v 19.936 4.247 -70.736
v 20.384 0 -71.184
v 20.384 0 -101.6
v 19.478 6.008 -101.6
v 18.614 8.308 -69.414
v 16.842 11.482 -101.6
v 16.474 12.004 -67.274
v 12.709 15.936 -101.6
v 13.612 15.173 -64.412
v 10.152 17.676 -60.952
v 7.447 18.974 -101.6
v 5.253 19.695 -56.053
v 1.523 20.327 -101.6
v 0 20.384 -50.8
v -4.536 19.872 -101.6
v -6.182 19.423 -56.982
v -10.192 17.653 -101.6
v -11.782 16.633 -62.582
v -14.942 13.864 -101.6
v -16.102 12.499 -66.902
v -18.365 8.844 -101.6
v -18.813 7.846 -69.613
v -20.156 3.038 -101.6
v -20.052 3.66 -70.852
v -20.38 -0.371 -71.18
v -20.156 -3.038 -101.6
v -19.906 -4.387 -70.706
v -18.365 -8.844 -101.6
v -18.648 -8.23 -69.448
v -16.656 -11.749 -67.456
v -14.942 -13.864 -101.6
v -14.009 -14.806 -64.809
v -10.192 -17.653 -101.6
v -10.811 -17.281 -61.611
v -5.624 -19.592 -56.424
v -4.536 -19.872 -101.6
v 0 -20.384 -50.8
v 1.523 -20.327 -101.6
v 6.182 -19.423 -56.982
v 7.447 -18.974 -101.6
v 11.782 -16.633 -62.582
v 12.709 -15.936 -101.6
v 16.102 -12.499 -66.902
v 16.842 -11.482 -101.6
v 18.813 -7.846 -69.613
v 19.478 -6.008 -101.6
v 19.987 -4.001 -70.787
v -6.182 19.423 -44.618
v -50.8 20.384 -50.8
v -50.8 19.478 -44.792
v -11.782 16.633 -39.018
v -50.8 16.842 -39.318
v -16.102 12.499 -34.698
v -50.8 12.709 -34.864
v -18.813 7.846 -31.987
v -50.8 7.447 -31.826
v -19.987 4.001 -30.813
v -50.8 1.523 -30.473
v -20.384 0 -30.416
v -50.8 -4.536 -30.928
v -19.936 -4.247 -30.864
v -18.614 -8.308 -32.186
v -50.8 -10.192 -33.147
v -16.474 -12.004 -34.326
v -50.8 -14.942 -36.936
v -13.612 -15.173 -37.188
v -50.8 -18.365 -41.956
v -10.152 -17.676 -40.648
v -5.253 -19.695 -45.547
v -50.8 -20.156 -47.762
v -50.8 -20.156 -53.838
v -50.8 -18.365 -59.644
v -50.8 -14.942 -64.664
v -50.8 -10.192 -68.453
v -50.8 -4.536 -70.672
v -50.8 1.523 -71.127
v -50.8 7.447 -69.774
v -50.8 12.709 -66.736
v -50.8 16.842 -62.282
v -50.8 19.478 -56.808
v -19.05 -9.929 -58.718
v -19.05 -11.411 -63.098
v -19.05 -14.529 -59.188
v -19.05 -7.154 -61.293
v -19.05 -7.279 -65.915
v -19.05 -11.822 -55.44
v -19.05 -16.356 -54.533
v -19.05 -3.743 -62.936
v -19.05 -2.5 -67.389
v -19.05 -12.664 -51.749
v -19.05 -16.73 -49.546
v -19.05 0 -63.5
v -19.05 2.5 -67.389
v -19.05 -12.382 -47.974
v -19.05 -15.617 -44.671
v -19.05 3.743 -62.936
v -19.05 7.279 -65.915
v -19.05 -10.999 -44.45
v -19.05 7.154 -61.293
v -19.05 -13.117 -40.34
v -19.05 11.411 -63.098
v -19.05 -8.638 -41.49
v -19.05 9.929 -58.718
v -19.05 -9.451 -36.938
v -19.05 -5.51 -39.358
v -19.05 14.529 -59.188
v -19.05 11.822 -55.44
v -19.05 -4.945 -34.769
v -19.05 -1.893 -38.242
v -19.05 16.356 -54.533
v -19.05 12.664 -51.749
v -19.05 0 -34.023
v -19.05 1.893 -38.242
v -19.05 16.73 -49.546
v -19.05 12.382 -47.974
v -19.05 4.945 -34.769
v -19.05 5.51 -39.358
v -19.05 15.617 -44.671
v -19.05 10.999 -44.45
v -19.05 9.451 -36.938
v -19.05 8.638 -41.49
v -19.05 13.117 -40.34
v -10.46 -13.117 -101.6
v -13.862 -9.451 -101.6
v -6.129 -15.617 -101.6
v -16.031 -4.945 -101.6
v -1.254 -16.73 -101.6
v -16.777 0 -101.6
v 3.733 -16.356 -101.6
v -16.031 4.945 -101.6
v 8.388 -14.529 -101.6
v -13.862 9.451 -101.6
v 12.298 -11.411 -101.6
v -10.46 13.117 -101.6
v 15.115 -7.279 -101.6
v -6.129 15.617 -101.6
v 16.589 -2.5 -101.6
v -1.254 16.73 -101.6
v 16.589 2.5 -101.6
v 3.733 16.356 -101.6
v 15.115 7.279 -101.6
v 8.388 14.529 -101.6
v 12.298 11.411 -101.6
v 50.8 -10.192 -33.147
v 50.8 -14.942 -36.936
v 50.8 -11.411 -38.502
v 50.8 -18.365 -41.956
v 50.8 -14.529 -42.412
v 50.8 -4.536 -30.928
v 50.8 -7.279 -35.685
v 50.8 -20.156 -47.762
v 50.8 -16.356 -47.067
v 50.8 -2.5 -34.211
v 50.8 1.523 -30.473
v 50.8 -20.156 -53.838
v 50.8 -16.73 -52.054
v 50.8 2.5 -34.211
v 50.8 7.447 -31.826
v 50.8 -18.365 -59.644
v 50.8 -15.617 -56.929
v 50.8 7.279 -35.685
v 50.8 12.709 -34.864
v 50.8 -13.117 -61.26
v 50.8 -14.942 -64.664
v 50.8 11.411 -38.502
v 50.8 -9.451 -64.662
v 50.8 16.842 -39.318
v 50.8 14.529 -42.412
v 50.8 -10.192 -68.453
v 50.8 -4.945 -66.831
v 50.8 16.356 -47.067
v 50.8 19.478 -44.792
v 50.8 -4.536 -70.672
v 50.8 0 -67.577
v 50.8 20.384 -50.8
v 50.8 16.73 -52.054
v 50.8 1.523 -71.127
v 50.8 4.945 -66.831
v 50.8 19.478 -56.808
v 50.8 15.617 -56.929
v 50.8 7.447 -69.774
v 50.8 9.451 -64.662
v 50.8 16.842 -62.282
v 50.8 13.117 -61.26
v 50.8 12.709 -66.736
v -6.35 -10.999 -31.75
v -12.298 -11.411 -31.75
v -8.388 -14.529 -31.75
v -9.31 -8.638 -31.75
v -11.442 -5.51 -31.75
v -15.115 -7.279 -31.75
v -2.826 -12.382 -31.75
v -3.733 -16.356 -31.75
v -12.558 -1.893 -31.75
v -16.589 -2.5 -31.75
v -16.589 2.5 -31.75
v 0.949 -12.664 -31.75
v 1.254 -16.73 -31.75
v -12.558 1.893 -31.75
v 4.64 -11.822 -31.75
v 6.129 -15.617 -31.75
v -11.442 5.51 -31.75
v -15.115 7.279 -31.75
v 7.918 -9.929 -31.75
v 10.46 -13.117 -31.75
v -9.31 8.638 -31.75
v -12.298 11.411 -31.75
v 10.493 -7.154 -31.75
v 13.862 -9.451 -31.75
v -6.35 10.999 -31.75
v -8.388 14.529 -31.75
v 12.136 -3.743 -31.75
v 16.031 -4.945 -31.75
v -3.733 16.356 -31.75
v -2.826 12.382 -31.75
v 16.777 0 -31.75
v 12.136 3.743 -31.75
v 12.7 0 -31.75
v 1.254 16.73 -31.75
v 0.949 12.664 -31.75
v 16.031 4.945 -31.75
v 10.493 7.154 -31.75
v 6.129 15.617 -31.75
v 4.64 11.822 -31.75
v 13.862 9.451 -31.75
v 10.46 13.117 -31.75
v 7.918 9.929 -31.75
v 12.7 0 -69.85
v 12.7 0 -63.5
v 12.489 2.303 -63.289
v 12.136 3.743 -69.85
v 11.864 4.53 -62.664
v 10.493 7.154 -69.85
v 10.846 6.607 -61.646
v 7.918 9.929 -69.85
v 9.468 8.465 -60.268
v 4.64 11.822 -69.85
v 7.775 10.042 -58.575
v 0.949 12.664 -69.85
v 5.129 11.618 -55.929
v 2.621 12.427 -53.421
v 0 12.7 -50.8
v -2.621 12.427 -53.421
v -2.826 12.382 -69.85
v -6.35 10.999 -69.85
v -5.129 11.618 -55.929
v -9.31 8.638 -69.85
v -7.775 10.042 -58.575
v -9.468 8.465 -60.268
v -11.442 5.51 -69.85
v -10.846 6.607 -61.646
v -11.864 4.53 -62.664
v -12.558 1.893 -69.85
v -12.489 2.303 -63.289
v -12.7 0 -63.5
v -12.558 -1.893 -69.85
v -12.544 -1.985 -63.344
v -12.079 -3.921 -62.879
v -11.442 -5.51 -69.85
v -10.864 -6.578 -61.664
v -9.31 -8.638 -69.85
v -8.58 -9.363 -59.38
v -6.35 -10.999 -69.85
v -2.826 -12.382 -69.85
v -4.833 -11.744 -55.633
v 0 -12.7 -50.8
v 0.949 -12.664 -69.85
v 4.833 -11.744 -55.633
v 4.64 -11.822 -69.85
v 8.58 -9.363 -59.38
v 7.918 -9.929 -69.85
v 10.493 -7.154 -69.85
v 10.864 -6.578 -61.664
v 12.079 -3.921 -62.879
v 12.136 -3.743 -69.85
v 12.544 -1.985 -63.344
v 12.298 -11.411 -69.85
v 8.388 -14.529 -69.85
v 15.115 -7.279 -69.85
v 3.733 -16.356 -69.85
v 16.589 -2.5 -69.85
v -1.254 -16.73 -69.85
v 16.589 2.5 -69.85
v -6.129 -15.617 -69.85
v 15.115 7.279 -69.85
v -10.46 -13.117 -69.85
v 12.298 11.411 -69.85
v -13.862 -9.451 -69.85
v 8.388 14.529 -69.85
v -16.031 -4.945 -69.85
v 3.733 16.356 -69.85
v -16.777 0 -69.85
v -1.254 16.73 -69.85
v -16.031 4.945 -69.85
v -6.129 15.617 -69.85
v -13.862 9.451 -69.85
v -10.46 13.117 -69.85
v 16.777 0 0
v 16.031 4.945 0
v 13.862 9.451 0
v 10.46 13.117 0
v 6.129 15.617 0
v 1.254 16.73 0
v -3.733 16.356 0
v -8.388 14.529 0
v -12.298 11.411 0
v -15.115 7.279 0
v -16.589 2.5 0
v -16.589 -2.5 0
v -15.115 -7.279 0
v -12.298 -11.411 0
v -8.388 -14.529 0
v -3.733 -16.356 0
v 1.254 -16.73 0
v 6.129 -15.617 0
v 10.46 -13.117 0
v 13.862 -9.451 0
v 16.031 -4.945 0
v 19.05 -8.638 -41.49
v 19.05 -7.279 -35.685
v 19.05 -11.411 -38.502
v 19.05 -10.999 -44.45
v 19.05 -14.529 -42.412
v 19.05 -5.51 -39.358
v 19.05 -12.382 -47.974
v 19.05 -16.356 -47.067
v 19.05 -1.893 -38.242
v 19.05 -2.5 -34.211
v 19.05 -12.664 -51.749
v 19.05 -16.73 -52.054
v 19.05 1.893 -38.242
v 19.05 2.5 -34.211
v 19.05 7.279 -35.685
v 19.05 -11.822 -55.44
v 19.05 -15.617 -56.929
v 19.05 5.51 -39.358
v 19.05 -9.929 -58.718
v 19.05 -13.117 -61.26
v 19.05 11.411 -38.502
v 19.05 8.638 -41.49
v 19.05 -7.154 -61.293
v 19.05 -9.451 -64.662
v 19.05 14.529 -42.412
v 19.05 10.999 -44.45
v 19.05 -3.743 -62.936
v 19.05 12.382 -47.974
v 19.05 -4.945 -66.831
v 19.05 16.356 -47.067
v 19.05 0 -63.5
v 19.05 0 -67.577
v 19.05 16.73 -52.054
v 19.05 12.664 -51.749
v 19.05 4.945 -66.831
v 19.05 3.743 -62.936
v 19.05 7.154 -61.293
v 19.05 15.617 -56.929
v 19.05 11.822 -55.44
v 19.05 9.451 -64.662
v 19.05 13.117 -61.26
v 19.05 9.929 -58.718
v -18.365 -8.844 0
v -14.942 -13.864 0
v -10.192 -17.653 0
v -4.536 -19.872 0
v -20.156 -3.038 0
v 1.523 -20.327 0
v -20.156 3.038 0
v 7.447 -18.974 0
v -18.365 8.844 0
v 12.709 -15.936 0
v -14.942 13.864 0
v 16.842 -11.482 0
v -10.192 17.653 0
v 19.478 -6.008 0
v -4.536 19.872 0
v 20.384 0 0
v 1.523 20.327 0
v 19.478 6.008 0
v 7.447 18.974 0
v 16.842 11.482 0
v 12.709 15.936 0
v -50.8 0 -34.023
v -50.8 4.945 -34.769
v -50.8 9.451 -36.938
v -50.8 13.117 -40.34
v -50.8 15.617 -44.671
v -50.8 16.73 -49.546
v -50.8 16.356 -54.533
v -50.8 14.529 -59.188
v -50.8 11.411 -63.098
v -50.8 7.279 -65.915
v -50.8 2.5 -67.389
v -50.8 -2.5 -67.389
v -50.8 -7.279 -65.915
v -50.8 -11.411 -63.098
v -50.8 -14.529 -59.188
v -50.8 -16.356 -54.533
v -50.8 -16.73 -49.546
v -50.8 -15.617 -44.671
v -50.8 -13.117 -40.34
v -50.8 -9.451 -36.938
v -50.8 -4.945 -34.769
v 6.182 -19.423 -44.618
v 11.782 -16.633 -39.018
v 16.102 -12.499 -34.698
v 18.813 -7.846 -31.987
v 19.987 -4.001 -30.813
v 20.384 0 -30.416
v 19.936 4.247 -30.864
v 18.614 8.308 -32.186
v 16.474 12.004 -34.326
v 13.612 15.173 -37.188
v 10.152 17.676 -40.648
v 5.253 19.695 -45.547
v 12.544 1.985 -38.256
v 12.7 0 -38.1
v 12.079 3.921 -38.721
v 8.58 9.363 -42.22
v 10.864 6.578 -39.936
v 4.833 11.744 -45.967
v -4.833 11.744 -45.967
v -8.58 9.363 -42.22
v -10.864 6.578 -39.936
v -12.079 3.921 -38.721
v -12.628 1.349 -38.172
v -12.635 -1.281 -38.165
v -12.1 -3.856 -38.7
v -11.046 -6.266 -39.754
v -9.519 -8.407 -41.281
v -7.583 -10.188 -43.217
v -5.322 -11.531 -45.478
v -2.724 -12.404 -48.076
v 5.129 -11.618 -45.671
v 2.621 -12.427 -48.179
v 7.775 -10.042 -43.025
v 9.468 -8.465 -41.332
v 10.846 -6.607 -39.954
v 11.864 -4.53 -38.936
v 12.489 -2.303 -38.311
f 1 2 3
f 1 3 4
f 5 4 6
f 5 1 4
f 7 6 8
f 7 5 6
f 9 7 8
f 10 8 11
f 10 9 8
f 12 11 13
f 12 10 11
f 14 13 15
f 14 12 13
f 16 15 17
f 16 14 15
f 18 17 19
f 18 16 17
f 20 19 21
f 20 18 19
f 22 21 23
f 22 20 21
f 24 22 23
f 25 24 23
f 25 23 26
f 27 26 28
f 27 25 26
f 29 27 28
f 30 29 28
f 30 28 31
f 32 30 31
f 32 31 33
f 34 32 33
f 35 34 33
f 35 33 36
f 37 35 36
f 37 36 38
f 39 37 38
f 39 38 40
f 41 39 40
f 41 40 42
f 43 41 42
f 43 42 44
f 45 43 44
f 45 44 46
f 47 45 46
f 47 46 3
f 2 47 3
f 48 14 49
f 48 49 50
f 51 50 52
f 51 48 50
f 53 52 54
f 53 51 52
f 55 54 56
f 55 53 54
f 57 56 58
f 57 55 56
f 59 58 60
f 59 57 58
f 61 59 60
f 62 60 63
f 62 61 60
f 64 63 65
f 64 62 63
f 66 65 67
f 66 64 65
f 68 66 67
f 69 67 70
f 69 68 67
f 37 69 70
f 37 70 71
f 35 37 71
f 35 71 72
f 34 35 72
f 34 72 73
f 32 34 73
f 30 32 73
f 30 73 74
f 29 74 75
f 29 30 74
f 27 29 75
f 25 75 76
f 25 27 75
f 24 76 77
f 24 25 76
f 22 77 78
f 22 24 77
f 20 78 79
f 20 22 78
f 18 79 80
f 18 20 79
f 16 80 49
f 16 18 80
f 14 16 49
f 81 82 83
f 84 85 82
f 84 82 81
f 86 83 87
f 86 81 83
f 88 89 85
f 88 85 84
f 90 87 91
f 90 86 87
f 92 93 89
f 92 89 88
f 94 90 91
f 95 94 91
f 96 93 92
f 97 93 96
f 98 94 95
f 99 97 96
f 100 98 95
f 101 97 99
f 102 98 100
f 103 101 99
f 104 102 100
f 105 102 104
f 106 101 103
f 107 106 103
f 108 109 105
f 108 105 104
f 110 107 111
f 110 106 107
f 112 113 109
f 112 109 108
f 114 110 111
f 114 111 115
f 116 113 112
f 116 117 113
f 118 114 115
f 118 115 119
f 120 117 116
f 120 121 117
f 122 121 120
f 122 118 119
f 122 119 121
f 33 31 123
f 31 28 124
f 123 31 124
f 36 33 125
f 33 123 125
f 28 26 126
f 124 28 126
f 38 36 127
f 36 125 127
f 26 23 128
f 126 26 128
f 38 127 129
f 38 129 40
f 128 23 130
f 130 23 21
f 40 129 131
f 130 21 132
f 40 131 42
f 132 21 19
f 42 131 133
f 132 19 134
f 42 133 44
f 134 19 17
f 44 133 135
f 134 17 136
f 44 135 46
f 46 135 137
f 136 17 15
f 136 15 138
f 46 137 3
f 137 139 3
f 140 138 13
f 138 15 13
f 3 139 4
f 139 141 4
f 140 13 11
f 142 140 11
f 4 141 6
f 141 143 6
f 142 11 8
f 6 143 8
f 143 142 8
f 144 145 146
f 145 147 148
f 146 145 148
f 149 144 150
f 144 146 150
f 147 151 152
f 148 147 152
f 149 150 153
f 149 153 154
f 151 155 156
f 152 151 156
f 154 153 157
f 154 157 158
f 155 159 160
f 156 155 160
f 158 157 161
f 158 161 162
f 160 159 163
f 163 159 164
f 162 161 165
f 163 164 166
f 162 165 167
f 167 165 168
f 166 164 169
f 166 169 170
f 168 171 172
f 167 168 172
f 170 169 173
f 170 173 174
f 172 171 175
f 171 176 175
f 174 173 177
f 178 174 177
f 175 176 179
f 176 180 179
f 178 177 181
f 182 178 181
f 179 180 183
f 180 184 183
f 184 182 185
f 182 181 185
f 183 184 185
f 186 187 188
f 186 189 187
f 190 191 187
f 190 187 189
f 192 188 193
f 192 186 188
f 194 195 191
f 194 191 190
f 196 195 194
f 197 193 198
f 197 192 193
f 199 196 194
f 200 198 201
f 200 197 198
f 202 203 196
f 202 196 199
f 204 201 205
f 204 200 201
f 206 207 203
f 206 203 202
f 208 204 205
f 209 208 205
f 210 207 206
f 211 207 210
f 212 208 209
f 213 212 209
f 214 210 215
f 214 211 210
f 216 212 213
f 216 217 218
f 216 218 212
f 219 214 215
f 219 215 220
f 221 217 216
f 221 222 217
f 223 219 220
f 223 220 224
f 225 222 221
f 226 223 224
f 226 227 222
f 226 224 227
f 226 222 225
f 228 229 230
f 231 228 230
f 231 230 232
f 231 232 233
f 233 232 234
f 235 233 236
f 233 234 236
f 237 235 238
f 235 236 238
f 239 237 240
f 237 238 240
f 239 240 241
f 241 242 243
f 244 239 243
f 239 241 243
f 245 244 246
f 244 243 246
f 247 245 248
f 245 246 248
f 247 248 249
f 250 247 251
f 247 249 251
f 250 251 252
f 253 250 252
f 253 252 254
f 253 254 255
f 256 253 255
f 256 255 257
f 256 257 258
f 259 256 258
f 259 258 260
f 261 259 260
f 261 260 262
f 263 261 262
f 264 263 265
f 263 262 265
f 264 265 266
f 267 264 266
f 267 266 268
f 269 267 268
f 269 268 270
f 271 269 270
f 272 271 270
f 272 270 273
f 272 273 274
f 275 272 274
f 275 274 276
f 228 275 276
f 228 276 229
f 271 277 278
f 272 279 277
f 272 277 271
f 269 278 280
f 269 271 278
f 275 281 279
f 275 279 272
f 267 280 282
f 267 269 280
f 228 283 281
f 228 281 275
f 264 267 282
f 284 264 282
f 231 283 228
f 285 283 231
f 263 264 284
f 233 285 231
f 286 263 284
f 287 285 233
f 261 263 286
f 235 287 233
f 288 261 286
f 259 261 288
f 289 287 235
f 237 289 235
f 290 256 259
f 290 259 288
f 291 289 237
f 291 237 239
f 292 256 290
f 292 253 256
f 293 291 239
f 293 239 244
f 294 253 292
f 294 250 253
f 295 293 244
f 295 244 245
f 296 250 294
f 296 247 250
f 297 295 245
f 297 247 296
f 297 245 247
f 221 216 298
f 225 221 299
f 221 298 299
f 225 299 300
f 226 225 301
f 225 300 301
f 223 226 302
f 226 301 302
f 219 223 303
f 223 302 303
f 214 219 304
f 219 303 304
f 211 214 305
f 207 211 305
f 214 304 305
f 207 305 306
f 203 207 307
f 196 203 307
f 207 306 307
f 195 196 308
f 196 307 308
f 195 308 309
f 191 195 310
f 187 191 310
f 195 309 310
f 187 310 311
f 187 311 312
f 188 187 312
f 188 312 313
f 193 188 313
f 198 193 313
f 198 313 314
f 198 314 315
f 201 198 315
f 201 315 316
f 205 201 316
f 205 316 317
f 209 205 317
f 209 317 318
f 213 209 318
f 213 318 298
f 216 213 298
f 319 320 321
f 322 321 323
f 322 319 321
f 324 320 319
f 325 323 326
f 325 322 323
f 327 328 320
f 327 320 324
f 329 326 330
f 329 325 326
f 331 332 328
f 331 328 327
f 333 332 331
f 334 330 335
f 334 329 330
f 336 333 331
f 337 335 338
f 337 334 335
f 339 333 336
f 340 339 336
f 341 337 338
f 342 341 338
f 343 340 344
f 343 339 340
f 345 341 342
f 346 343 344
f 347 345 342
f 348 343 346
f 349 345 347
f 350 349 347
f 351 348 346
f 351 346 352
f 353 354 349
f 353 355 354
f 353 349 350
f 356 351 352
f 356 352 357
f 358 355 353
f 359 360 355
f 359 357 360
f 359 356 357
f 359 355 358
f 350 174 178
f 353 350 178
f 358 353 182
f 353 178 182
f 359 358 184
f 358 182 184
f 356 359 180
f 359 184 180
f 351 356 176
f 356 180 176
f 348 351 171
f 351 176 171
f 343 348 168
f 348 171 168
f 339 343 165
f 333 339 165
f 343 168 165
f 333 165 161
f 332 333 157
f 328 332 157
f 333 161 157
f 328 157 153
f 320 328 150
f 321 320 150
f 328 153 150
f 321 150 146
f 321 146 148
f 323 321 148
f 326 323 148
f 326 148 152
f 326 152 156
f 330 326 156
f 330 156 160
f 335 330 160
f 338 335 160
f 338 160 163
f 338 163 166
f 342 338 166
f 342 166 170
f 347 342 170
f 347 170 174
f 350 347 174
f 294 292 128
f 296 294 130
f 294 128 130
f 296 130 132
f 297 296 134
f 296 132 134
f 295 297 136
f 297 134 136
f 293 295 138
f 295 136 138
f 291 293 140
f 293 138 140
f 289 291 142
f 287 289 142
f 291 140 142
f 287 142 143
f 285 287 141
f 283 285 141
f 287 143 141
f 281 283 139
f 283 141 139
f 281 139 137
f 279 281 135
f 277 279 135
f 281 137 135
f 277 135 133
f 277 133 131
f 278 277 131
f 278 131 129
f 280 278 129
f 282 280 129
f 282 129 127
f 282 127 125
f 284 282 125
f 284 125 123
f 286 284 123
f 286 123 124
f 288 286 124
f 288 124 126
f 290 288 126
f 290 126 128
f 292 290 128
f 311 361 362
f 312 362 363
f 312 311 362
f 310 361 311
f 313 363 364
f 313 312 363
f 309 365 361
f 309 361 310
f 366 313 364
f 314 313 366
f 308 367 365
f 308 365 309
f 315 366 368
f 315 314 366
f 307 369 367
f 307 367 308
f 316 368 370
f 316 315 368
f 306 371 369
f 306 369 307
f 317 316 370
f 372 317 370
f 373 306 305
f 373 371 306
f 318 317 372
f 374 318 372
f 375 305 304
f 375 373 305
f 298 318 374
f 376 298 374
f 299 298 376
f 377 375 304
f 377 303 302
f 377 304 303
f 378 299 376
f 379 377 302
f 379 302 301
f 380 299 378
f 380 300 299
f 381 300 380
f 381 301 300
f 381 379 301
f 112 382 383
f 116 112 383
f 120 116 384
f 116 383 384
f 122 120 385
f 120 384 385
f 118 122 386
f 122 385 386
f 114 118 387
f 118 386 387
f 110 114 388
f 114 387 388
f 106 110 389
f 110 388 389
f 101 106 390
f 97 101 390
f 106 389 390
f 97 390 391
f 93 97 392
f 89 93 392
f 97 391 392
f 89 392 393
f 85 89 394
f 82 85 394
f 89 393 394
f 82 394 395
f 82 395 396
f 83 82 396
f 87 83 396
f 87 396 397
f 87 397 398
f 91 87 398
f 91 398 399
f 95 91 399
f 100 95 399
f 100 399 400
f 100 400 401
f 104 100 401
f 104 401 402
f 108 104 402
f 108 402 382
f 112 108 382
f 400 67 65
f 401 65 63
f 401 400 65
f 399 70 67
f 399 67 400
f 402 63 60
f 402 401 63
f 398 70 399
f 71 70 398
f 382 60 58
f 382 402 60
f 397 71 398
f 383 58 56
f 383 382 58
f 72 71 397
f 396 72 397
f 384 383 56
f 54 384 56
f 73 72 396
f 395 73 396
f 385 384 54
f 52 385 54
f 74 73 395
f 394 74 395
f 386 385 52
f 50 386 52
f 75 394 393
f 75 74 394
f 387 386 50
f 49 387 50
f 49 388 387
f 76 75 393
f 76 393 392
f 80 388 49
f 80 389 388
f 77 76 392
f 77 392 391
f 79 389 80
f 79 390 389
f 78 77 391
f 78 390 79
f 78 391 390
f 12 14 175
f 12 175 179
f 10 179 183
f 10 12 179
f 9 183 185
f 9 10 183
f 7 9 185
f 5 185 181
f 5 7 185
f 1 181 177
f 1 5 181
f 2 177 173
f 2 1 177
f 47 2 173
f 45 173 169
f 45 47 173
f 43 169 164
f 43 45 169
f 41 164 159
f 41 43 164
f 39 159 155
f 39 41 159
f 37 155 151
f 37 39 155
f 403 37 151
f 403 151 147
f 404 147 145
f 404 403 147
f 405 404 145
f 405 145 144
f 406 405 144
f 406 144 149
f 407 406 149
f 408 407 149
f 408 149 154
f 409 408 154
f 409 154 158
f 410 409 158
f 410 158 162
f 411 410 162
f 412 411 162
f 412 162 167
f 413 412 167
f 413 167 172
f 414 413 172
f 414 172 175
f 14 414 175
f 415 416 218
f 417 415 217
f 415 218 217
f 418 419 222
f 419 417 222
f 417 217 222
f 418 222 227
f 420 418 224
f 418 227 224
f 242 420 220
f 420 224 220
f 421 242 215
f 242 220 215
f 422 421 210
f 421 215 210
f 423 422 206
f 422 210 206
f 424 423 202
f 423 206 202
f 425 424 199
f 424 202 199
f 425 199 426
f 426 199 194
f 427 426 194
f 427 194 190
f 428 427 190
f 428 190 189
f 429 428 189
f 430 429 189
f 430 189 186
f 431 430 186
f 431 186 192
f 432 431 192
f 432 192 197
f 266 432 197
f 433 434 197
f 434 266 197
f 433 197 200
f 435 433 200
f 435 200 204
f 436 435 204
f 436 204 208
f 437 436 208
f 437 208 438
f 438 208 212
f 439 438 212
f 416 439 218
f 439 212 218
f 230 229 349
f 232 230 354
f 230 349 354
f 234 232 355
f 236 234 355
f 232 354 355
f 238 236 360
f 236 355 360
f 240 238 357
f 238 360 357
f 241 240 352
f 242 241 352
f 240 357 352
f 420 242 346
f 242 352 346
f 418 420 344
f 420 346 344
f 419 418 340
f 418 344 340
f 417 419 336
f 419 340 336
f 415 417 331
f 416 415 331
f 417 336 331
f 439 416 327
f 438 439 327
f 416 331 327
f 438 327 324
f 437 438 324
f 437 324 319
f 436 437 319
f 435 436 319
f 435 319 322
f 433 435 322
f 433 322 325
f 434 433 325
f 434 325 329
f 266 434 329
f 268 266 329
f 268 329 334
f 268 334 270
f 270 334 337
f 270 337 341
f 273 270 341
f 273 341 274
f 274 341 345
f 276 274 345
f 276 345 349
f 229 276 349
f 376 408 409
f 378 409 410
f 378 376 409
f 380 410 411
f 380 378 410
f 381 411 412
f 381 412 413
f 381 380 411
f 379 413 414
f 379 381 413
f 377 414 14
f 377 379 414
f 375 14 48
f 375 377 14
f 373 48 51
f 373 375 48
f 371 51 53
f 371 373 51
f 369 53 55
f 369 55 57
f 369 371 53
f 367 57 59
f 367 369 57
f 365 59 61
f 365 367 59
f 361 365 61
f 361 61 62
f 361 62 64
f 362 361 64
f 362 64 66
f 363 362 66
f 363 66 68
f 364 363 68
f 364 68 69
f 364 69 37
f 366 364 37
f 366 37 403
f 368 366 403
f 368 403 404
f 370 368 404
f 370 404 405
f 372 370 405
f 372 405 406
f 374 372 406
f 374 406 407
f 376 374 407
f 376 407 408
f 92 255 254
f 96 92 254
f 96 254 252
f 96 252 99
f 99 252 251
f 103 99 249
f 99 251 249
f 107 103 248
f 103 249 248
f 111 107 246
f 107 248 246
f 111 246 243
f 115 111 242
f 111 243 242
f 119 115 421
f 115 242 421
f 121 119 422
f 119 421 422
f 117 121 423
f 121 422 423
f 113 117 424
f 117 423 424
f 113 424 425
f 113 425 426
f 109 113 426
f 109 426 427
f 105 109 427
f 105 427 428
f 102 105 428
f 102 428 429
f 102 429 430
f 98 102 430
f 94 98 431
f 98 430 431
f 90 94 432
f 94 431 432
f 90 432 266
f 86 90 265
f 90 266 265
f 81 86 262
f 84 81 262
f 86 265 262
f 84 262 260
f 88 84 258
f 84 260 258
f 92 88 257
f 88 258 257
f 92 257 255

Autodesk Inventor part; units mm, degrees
ref_plane "YZ Plane" through (0, 0, 0) normal (1, 0, 0) x (0, 1, 0)
ref_plane "XZ Plane" through (0, 0, 0) normal (0, 1, 0) x (-1, 0, 0)
sketch "Sketch1" plane through (0, 0, 0) normal (0, 0, 1) x (1, 0, 0)
  circle A0 centre (0, 0) radius 20.3835
  dimension "d0" = 40.767
extrude "Extrusion1" add sketch "Sketch1" against normal blind 101.6
sketch "Sketch2" plane through (0, 0, 0) normal (0, 0, 1) x (1, 0, 0)
  line L0 (0, 0) -> (0, 19.704)
sketch "Sketch3" plane through (0, 0, -101.6) normal (0, 0, -1) x (-1, 0, 0)
  line L0 (0, 0) -> (0, 20.098)
ref_plane "Work Plane1" through (0, 0, 0) normal (-1, 0, 0) x (0, 1, 0)
sketch "Sketch4" plane through (0, 0, 0) normal (-1, 0, 0) x (0, 1, 0)
  circle A0 centre (0, 50.8) radius 20.3835
  point P0 (0, 0)
extrude "Extrusion2" add sketch "Sketch4" along normal mid plane 101.6
sketch "Sketch5" plane through (0, 0, 0) normal (0, 0, 1) x (1, 0, 0)
  circle A0 centre (0, 0) radius 16.7767
  dimension "d5" = 33.5534
sketch "Sketch6" plane through (50.8, 0, -50.8) normal (1, 0, 0) x (0, 0, -1)
  circle A0 centre (0, 0) radius 16.7767
  point P0 (-50.8, 0)
  dimension "d6" = 33.5534
sketch "Sketch7" plane through (0, 0, -101.6) normal (0, 0, -1) x (-1, 0, 0)
  circle A0 centre (0, 0) radius 20.3835 projected
  circle A1 centre (0, 0) radius 16.7767
  dimension "d7" = 33.5534
sketch "Sketch8" plane through (-50.8, 0, -50.8) normal (-1, 0, 0) x (0, 0, 1)
  circle A0 centre (0, 0) radius 16.7767
  point P0 (50.8, 0)
  dimension "d8" = 33.5534
extrude "Extrusion3" cut sketch "Sketch5" against normal blind 31.75
extrude "Extrusion4" cut sketch "Sketch6" against normal blind 31.75
extrude "Extrusion5" cut sketch "Sketch7" against normal blind 31.75 contours A1
extrude "Extrusion6" cut sketch "Sketch8" against normal blind 31.75
sketch "Sketch9" plane through (0, 0, 0) normal (0, 0, 1) x (1, 0, 0)
  circle A0 centre (0, 0) radius 12.7
  dimension "d17" = 25.4
sketch "Sketch10" plane through (50.8, 0, -50.8) normal (1, 0, 0) x (0, 0, -1)
  circle A0 centre (0, 0) radius 12.7
  point P0 (-50.8, 0)
  dimension "d18" = 25.4
extrude "Extrusion7" cut sketch "Sketch10" against normal blind 101.6
extrude "Extrusion8" cut sketch "Sketch9" against normal blind 101.6
properties part number "Cross 1 Inch"
